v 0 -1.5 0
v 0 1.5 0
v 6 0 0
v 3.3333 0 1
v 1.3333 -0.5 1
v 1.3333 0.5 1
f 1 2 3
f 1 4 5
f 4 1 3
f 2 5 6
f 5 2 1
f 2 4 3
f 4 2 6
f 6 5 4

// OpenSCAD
//------------------------------------------------------------------------------
// Copyright 2022 E. Kooistra
//
// Licensed under the Apache License, Version 2.0 (the "License");
// you may not use this file except in compliance with the License.
// You may obtain a copy of the License at
//
//     http://www.apache.org/licenses/LICENSE-2.0
//
// Unless required by applicable law or agreed to in writing, software
// distributed under the License is distributed on an "AS IS" BASIS,
// WITHOUT WARRANTIES OR CONDITIONS OF ANY KIND, either express or implied.
// See the License for the specific language governing permissions and
// limitations under the License.
//------------------------------------------------------------------------------
//
// Author: E. Kooistra, March 2022
// Purpose: Library to create a triangle shape marker.
// Description:
//  . The marker can be place on an element to provide an orientation marker.

//------------------------------------------------------------------------------
// TriangleCylinder
//------------------------------------------------------------------------------

module TriangleCylinder(R_bottom, R_top, h) {
    // Create triangle volume with 3 equal edges using a cylinder with 3 facets:
    //
    //     cylinder($fn = 3, h=h, r1=R_bottom, r2=R_top, center=false);
    //
    // This is equivalent to polyhedron() of points and faces. Centred with
    // radius R and one corner on X-axis at [R_bottom, 0, 0].

    TrianglePoints = [
        [   R_bottom,                   0, 0],  //0
        [-R_bottom/2,  R_bottom*sqrt(3)/2, 0],  //1
        [-R_bottom/2, -R_bottom*sqrt(3)/2, 0],  //2
        [      R_top,                   0, h],  //3
        [   -R_top/2,     R_top*sqrt(3)/2, h],  //4
        [   -R_top/2,    -R_top*sqrt(3)/2, h]]; //5

    TriangleFaces = [
        [0,1,2],   // bottom
        [0,2,5,3], // side
        [2,1,4,5], // side
        [0,3,4,1], // side
        [3,5,4]];  // top

    polyhedron(TrianglePoints, TriangleFaces);
}

//------------------------------------------------------------------------------
// TriangleMarker
//------------------------------------------------------------------------------

module TriangleMarker(Lx_bottom, Wy_bottom, Wy_top, Hz) {
    // Create triangle with base edge of width Wy_bottom at the Y-axis and two equal
    // length edges that meet in a corner at [Lx_bottom, 0, 0]
    //
    // Translate TriangleCylinder to have back edge on Y-axis and then
    // resize to have X corner position to [Lx_bottom, 0, 0]

    resize([Lx_bottom, Wy_bottom, Hz]) translate([Wy_bottom/2, 0, 0]) TriangleCylinder(Wy_bottom, Wy_top, Hz);
}


//------------------------------------------------------------------------------
// UNIT TEST
//------------------------------------------------------------------------------

TriangleMarker(6, 3, 1, 1);
